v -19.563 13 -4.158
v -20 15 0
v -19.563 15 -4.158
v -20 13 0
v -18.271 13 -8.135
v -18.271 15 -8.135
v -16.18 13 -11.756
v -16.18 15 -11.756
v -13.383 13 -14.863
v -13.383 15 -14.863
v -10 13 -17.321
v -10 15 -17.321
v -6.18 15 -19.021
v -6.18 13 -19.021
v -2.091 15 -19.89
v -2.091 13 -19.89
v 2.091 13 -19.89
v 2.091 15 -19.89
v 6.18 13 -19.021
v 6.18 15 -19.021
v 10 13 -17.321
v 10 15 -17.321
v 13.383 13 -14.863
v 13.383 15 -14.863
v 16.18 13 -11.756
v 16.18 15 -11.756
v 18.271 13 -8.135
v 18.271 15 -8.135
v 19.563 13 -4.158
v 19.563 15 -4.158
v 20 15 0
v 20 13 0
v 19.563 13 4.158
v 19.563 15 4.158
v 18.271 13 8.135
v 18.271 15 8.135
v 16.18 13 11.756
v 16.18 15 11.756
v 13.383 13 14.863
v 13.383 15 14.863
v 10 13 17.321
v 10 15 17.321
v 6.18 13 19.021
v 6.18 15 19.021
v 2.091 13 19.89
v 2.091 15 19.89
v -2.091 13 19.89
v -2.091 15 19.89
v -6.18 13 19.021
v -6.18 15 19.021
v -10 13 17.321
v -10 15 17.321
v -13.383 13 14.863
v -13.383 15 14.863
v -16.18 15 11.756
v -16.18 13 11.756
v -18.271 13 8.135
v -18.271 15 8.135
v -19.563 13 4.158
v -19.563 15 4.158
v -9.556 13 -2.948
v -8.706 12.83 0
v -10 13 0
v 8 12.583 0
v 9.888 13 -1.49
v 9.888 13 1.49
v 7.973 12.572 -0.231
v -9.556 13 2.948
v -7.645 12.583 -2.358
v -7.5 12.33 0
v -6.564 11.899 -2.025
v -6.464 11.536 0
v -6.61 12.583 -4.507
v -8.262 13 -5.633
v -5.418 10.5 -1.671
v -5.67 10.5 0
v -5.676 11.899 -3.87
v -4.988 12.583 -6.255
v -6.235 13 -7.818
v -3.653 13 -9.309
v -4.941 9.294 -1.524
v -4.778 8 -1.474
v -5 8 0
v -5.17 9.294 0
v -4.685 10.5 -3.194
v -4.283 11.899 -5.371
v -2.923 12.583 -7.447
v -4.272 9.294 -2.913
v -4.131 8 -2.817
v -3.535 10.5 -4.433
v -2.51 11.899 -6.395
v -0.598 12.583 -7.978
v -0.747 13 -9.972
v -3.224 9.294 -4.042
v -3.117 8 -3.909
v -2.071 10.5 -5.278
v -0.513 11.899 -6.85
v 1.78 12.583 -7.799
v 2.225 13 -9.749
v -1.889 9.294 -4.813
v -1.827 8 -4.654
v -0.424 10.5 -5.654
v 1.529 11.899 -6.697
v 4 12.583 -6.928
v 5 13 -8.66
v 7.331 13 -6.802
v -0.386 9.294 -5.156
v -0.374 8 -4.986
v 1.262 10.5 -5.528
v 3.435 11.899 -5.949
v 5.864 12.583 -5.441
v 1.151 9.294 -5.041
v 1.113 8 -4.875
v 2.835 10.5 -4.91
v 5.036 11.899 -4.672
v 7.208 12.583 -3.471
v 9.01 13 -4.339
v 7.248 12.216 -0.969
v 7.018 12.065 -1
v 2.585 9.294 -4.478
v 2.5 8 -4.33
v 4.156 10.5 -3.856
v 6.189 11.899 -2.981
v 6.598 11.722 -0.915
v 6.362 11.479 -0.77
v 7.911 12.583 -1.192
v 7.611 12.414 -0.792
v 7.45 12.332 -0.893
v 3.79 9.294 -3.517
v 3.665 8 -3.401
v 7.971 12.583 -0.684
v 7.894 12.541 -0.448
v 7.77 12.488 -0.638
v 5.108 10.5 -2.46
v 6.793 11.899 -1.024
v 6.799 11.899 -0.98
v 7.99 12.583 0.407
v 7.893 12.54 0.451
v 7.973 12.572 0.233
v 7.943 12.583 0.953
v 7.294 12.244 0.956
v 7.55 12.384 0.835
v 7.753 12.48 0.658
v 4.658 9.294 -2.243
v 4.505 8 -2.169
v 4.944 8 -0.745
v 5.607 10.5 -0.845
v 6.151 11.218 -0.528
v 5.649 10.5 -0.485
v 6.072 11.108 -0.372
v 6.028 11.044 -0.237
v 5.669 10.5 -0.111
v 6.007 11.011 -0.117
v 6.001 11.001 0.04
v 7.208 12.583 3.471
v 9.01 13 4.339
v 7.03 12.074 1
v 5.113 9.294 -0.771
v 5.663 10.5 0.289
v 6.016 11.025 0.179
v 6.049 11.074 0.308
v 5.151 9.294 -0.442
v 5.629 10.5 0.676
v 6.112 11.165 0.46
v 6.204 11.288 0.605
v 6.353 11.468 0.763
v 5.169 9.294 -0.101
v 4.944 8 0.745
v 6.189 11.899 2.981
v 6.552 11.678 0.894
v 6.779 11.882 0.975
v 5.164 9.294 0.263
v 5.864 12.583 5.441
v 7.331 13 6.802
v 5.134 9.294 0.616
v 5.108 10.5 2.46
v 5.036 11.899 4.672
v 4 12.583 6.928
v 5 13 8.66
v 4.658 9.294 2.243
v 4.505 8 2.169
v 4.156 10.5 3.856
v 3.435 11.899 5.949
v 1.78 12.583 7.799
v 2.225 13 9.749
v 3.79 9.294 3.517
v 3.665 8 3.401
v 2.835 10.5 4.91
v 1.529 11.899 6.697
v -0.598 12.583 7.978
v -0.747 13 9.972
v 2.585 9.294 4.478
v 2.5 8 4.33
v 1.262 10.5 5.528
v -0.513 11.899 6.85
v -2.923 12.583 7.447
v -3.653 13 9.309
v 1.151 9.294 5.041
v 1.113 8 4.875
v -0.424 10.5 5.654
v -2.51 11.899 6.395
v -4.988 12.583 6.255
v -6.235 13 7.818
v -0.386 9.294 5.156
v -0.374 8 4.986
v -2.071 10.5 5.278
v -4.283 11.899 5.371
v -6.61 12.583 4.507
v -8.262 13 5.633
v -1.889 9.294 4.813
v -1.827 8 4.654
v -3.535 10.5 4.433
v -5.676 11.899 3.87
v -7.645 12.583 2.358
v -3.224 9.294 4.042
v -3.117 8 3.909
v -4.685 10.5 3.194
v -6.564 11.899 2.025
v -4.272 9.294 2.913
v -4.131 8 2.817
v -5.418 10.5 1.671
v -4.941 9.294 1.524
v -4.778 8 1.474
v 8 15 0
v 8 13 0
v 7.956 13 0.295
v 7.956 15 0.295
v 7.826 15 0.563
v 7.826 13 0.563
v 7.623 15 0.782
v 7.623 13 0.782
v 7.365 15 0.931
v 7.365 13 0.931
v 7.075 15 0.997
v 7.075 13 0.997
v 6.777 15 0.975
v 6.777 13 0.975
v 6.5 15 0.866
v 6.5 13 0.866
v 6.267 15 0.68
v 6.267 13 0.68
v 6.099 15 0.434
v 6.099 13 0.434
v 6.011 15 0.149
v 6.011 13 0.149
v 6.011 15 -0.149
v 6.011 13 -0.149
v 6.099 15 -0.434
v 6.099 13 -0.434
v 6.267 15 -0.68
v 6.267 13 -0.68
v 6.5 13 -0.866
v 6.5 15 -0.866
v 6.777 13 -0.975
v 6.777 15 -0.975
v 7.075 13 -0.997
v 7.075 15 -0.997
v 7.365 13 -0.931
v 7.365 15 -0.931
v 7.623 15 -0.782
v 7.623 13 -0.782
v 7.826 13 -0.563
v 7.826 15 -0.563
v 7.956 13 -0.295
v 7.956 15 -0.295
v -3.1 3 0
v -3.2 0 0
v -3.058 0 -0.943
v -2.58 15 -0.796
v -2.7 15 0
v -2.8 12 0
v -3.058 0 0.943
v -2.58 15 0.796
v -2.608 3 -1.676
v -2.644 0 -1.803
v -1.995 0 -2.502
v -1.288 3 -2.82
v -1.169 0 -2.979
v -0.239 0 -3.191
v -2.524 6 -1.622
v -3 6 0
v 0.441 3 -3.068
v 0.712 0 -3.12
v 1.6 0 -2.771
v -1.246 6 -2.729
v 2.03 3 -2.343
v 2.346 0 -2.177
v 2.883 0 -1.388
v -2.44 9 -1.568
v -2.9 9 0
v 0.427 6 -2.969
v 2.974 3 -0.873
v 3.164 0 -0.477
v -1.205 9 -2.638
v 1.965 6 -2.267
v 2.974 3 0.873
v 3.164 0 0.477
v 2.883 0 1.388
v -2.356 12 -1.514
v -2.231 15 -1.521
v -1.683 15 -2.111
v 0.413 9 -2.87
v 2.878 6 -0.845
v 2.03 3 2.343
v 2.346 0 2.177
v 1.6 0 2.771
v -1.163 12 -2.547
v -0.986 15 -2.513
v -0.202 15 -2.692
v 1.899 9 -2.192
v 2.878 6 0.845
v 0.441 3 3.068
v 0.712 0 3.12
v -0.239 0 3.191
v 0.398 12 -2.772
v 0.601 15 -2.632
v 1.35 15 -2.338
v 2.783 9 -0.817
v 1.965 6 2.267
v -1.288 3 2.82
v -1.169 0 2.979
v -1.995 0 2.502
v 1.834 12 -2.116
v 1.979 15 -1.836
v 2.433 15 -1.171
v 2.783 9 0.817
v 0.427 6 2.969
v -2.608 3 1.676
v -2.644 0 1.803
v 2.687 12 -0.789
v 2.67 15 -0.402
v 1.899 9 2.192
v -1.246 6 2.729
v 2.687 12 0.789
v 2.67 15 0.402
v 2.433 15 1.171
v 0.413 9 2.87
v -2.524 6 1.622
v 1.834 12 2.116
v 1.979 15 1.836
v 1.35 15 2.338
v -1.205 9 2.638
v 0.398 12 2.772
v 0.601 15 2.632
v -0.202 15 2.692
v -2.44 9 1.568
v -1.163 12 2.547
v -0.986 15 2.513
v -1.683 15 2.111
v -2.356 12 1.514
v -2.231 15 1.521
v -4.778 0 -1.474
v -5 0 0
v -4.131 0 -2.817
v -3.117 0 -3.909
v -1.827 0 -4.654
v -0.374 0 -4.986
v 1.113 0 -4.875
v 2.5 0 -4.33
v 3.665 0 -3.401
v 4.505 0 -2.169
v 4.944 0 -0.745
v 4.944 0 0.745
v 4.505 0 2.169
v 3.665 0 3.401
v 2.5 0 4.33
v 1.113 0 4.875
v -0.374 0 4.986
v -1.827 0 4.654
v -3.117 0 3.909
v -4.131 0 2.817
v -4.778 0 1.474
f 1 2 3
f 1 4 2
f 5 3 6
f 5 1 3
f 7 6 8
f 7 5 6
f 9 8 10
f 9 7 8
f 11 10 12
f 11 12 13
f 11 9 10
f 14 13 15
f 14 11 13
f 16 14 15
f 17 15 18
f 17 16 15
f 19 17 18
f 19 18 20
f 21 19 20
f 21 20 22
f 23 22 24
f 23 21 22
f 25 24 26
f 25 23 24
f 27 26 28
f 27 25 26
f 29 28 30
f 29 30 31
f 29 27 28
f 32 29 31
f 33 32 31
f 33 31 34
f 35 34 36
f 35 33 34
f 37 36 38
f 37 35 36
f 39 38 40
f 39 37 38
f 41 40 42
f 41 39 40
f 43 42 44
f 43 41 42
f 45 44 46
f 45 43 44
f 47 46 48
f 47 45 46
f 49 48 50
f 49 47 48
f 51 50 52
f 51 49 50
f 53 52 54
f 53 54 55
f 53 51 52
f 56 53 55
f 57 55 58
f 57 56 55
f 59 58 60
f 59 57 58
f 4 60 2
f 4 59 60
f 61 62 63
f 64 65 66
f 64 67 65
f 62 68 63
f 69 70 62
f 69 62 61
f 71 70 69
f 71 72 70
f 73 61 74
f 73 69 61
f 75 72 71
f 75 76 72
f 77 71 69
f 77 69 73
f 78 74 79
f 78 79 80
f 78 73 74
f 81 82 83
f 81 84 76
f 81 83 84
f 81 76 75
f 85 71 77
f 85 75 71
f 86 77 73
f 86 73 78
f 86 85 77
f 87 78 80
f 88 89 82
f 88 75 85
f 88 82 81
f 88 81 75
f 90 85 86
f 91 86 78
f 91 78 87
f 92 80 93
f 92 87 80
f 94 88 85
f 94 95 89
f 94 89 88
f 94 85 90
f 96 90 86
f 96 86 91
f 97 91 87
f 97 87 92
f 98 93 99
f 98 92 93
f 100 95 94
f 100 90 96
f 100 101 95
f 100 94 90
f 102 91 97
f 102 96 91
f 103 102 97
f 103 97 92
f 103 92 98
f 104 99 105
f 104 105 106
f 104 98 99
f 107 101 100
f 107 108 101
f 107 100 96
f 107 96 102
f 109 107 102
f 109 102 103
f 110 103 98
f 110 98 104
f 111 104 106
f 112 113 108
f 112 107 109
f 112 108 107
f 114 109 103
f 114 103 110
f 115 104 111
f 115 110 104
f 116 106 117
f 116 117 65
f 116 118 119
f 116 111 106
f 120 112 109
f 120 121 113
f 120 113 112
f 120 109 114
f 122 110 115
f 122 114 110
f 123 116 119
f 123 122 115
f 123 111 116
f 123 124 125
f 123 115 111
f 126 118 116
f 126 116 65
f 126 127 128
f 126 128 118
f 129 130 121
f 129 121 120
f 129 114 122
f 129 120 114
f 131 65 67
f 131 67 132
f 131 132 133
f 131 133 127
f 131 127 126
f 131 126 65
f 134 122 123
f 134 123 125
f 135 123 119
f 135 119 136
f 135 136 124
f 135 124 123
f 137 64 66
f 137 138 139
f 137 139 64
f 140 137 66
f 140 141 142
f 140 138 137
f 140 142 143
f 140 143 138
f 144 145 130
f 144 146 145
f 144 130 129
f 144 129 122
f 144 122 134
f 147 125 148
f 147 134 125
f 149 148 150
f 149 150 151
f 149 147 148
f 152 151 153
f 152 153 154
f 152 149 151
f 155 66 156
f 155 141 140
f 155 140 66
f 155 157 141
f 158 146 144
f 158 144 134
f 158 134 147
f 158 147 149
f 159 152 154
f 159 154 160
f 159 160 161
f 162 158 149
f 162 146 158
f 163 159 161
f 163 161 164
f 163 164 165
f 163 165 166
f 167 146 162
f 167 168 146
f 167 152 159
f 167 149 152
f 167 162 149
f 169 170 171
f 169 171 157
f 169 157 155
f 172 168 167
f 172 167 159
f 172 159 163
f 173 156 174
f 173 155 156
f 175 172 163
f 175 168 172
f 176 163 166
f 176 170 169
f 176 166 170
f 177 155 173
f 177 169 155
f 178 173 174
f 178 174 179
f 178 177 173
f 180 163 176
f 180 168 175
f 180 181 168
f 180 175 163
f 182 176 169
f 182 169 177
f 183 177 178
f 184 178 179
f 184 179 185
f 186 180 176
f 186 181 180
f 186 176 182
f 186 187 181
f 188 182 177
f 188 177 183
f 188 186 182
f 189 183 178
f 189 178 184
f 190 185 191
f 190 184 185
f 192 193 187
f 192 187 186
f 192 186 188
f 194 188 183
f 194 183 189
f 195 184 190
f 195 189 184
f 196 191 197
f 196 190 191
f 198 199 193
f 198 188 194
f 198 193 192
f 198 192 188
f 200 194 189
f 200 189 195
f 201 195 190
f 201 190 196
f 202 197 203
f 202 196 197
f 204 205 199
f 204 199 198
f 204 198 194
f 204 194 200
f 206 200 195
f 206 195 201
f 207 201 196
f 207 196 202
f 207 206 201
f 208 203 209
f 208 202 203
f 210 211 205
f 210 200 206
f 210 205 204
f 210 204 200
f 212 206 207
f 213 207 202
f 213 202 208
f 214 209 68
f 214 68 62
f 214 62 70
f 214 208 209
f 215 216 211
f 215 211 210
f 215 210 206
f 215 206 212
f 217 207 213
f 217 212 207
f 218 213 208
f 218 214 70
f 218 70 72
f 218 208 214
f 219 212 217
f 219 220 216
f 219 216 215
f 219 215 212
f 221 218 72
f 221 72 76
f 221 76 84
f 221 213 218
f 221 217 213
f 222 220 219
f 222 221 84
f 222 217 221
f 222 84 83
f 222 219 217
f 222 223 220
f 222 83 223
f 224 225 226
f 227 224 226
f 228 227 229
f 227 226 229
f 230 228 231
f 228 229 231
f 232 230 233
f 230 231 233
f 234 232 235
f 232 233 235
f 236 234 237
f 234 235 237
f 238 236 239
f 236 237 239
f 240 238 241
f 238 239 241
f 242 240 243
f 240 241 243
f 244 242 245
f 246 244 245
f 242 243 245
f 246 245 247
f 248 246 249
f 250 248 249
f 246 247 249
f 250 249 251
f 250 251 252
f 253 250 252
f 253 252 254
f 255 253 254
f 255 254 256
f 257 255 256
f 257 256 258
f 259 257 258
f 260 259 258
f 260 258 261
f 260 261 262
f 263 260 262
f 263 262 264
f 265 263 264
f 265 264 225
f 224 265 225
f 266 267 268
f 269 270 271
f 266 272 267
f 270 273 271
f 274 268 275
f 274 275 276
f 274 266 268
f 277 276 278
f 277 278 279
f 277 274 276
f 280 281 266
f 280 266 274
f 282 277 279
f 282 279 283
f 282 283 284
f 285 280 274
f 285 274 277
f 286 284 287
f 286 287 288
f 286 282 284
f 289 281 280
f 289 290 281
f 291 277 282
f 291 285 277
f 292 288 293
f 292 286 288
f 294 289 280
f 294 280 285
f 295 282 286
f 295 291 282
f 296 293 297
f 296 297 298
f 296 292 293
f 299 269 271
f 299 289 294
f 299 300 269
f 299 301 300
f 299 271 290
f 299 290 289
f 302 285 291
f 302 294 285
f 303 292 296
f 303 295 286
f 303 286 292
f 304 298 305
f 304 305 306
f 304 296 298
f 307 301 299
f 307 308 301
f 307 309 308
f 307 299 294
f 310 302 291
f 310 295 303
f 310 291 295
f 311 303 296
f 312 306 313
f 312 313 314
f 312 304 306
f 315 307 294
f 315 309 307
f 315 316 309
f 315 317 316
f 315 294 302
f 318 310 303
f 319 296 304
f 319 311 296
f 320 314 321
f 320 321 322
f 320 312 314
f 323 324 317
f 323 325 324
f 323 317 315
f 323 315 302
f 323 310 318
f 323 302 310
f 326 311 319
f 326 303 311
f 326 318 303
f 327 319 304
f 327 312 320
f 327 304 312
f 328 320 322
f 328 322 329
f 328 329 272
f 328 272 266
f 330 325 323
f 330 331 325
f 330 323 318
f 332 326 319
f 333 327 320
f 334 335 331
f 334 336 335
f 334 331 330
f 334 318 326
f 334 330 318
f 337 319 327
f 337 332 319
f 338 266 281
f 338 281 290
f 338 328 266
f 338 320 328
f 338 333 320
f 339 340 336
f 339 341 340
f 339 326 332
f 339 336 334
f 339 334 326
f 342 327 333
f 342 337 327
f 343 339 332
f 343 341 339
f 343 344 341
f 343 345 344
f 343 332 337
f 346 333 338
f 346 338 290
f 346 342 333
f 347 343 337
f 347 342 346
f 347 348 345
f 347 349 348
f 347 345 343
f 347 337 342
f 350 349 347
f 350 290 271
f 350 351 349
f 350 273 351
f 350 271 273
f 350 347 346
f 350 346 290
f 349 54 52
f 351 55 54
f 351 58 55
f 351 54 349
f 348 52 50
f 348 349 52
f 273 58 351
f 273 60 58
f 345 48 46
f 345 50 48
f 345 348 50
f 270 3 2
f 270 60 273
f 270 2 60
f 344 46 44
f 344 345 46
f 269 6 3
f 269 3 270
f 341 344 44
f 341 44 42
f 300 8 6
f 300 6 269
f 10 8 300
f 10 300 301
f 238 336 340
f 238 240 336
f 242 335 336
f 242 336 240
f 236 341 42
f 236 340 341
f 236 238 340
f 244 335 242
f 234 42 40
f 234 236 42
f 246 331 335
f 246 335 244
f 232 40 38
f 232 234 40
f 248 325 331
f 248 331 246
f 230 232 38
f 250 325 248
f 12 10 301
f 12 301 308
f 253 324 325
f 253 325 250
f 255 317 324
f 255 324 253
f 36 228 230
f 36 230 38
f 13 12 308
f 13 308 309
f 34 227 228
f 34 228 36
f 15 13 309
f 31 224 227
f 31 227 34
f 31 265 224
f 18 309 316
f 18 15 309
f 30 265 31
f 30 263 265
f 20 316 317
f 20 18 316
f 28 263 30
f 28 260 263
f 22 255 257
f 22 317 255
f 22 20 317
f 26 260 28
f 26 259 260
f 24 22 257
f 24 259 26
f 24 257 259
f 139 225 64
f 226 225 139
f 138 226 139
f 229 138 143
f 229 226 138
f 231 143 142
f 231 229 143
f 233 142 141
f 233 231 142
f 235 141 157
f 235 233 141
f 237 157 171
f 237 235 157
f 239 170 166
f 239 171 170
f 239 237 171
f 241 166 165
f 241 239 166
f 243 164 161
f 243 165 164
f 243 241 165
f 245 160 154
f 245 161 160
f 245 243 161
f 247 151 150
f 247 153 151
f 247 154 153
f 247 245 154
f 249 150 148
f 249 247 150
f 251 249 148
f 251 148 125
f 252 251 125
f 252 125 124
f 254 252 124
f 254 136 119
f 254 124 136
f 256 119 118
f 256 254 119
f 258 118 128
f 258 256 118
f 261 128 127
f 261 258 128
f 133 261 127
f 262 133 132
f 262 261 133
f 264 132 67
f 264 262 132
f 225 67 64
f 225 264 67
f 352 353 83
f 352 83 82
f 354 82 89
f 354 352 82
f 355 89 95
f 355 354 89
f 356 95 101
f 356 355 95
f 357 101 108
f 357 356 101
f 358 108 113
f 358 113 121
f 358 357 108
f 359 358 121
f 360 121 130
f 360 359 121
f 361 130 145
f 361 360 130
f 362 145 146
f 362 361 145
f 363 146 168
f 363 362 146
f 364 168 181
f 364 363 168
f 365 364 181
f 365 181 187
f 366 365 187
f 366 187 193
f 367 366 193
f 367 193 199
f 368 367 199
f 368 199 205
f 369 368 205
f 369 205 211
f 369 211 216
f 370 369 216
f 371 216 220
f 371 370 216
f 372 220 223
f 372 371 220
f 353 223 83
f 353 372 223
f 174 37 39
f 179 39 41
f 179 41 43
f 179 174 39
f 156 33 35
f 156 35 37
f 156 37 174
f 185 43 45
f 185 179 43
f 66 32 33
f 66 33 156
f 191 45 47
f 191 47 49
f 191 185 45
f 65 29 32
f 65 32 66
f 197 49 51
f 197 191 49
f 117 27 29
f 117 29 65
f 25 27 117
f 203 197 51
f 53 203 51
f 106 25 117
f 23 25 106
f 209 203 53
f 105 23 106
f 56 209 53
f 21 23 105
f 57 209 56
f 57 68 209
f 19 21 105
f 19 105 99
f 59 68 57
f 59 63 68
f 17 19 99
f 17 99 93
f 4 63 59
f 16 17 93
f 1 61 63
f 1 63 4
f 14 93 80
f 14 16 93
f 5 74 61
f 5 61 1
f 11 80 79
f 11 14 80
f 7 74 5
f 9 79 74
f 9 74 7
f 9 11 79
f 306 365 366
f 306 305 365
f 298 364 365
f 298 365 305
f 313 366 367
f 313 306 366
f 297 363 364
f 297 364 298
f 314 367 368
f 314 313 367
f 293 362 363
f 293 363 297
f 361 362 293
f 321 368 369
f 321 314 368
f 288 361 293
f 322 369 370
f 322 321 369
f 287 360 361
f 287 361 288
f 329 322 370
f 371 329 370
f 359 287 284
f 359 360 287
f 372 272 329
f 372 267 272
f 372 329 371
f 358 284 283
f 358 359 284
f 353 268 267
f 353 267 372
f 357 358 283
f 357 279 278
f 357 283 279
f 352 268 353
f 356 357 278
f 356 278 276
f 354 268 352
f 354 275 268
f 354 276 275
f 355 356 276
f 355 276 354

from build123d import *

# Parameters (mm, degrees)
F2_R          = 5
F3_R          = 1
F4_DEPTH      = 2.001
F4_DEPTH_BACK = 13.001


with BuildPart() as f1:
    # F0 (on Top) → F1 (revolve)
    with BuildSketch(Plane.XY):
        Polygon((-5, 0), (-3.2, 0), (-2.7, 15), (-20, 15), (-20, 13), (-5, 13), align=None)
    revolve(axis=Axis((0, -0.5978257842, 0), (0, -1, 0)))

    # F2
    f2_edges = [f1.edges().sort_by_distance(p)[0] for p in [
        (5, 13, 0),
    ]]
    fillet(f2_edges, radius=F2_R)

    # F3 (on face) → F4 (cut, two sides)
    with BuildSketch(Plane.XZ.offset(-13)) as f4_sk:
        with Locations((7, 0)):
            Circle(F3_R)
    extrude(amount=-F4_DEPTH, mode=Mode.SUBTRACT)
    extrude(f4_sk.sketch, amount=F4_DEPTH_BACK, mode=Mode.SUBTRACT)


solid = f1.part
